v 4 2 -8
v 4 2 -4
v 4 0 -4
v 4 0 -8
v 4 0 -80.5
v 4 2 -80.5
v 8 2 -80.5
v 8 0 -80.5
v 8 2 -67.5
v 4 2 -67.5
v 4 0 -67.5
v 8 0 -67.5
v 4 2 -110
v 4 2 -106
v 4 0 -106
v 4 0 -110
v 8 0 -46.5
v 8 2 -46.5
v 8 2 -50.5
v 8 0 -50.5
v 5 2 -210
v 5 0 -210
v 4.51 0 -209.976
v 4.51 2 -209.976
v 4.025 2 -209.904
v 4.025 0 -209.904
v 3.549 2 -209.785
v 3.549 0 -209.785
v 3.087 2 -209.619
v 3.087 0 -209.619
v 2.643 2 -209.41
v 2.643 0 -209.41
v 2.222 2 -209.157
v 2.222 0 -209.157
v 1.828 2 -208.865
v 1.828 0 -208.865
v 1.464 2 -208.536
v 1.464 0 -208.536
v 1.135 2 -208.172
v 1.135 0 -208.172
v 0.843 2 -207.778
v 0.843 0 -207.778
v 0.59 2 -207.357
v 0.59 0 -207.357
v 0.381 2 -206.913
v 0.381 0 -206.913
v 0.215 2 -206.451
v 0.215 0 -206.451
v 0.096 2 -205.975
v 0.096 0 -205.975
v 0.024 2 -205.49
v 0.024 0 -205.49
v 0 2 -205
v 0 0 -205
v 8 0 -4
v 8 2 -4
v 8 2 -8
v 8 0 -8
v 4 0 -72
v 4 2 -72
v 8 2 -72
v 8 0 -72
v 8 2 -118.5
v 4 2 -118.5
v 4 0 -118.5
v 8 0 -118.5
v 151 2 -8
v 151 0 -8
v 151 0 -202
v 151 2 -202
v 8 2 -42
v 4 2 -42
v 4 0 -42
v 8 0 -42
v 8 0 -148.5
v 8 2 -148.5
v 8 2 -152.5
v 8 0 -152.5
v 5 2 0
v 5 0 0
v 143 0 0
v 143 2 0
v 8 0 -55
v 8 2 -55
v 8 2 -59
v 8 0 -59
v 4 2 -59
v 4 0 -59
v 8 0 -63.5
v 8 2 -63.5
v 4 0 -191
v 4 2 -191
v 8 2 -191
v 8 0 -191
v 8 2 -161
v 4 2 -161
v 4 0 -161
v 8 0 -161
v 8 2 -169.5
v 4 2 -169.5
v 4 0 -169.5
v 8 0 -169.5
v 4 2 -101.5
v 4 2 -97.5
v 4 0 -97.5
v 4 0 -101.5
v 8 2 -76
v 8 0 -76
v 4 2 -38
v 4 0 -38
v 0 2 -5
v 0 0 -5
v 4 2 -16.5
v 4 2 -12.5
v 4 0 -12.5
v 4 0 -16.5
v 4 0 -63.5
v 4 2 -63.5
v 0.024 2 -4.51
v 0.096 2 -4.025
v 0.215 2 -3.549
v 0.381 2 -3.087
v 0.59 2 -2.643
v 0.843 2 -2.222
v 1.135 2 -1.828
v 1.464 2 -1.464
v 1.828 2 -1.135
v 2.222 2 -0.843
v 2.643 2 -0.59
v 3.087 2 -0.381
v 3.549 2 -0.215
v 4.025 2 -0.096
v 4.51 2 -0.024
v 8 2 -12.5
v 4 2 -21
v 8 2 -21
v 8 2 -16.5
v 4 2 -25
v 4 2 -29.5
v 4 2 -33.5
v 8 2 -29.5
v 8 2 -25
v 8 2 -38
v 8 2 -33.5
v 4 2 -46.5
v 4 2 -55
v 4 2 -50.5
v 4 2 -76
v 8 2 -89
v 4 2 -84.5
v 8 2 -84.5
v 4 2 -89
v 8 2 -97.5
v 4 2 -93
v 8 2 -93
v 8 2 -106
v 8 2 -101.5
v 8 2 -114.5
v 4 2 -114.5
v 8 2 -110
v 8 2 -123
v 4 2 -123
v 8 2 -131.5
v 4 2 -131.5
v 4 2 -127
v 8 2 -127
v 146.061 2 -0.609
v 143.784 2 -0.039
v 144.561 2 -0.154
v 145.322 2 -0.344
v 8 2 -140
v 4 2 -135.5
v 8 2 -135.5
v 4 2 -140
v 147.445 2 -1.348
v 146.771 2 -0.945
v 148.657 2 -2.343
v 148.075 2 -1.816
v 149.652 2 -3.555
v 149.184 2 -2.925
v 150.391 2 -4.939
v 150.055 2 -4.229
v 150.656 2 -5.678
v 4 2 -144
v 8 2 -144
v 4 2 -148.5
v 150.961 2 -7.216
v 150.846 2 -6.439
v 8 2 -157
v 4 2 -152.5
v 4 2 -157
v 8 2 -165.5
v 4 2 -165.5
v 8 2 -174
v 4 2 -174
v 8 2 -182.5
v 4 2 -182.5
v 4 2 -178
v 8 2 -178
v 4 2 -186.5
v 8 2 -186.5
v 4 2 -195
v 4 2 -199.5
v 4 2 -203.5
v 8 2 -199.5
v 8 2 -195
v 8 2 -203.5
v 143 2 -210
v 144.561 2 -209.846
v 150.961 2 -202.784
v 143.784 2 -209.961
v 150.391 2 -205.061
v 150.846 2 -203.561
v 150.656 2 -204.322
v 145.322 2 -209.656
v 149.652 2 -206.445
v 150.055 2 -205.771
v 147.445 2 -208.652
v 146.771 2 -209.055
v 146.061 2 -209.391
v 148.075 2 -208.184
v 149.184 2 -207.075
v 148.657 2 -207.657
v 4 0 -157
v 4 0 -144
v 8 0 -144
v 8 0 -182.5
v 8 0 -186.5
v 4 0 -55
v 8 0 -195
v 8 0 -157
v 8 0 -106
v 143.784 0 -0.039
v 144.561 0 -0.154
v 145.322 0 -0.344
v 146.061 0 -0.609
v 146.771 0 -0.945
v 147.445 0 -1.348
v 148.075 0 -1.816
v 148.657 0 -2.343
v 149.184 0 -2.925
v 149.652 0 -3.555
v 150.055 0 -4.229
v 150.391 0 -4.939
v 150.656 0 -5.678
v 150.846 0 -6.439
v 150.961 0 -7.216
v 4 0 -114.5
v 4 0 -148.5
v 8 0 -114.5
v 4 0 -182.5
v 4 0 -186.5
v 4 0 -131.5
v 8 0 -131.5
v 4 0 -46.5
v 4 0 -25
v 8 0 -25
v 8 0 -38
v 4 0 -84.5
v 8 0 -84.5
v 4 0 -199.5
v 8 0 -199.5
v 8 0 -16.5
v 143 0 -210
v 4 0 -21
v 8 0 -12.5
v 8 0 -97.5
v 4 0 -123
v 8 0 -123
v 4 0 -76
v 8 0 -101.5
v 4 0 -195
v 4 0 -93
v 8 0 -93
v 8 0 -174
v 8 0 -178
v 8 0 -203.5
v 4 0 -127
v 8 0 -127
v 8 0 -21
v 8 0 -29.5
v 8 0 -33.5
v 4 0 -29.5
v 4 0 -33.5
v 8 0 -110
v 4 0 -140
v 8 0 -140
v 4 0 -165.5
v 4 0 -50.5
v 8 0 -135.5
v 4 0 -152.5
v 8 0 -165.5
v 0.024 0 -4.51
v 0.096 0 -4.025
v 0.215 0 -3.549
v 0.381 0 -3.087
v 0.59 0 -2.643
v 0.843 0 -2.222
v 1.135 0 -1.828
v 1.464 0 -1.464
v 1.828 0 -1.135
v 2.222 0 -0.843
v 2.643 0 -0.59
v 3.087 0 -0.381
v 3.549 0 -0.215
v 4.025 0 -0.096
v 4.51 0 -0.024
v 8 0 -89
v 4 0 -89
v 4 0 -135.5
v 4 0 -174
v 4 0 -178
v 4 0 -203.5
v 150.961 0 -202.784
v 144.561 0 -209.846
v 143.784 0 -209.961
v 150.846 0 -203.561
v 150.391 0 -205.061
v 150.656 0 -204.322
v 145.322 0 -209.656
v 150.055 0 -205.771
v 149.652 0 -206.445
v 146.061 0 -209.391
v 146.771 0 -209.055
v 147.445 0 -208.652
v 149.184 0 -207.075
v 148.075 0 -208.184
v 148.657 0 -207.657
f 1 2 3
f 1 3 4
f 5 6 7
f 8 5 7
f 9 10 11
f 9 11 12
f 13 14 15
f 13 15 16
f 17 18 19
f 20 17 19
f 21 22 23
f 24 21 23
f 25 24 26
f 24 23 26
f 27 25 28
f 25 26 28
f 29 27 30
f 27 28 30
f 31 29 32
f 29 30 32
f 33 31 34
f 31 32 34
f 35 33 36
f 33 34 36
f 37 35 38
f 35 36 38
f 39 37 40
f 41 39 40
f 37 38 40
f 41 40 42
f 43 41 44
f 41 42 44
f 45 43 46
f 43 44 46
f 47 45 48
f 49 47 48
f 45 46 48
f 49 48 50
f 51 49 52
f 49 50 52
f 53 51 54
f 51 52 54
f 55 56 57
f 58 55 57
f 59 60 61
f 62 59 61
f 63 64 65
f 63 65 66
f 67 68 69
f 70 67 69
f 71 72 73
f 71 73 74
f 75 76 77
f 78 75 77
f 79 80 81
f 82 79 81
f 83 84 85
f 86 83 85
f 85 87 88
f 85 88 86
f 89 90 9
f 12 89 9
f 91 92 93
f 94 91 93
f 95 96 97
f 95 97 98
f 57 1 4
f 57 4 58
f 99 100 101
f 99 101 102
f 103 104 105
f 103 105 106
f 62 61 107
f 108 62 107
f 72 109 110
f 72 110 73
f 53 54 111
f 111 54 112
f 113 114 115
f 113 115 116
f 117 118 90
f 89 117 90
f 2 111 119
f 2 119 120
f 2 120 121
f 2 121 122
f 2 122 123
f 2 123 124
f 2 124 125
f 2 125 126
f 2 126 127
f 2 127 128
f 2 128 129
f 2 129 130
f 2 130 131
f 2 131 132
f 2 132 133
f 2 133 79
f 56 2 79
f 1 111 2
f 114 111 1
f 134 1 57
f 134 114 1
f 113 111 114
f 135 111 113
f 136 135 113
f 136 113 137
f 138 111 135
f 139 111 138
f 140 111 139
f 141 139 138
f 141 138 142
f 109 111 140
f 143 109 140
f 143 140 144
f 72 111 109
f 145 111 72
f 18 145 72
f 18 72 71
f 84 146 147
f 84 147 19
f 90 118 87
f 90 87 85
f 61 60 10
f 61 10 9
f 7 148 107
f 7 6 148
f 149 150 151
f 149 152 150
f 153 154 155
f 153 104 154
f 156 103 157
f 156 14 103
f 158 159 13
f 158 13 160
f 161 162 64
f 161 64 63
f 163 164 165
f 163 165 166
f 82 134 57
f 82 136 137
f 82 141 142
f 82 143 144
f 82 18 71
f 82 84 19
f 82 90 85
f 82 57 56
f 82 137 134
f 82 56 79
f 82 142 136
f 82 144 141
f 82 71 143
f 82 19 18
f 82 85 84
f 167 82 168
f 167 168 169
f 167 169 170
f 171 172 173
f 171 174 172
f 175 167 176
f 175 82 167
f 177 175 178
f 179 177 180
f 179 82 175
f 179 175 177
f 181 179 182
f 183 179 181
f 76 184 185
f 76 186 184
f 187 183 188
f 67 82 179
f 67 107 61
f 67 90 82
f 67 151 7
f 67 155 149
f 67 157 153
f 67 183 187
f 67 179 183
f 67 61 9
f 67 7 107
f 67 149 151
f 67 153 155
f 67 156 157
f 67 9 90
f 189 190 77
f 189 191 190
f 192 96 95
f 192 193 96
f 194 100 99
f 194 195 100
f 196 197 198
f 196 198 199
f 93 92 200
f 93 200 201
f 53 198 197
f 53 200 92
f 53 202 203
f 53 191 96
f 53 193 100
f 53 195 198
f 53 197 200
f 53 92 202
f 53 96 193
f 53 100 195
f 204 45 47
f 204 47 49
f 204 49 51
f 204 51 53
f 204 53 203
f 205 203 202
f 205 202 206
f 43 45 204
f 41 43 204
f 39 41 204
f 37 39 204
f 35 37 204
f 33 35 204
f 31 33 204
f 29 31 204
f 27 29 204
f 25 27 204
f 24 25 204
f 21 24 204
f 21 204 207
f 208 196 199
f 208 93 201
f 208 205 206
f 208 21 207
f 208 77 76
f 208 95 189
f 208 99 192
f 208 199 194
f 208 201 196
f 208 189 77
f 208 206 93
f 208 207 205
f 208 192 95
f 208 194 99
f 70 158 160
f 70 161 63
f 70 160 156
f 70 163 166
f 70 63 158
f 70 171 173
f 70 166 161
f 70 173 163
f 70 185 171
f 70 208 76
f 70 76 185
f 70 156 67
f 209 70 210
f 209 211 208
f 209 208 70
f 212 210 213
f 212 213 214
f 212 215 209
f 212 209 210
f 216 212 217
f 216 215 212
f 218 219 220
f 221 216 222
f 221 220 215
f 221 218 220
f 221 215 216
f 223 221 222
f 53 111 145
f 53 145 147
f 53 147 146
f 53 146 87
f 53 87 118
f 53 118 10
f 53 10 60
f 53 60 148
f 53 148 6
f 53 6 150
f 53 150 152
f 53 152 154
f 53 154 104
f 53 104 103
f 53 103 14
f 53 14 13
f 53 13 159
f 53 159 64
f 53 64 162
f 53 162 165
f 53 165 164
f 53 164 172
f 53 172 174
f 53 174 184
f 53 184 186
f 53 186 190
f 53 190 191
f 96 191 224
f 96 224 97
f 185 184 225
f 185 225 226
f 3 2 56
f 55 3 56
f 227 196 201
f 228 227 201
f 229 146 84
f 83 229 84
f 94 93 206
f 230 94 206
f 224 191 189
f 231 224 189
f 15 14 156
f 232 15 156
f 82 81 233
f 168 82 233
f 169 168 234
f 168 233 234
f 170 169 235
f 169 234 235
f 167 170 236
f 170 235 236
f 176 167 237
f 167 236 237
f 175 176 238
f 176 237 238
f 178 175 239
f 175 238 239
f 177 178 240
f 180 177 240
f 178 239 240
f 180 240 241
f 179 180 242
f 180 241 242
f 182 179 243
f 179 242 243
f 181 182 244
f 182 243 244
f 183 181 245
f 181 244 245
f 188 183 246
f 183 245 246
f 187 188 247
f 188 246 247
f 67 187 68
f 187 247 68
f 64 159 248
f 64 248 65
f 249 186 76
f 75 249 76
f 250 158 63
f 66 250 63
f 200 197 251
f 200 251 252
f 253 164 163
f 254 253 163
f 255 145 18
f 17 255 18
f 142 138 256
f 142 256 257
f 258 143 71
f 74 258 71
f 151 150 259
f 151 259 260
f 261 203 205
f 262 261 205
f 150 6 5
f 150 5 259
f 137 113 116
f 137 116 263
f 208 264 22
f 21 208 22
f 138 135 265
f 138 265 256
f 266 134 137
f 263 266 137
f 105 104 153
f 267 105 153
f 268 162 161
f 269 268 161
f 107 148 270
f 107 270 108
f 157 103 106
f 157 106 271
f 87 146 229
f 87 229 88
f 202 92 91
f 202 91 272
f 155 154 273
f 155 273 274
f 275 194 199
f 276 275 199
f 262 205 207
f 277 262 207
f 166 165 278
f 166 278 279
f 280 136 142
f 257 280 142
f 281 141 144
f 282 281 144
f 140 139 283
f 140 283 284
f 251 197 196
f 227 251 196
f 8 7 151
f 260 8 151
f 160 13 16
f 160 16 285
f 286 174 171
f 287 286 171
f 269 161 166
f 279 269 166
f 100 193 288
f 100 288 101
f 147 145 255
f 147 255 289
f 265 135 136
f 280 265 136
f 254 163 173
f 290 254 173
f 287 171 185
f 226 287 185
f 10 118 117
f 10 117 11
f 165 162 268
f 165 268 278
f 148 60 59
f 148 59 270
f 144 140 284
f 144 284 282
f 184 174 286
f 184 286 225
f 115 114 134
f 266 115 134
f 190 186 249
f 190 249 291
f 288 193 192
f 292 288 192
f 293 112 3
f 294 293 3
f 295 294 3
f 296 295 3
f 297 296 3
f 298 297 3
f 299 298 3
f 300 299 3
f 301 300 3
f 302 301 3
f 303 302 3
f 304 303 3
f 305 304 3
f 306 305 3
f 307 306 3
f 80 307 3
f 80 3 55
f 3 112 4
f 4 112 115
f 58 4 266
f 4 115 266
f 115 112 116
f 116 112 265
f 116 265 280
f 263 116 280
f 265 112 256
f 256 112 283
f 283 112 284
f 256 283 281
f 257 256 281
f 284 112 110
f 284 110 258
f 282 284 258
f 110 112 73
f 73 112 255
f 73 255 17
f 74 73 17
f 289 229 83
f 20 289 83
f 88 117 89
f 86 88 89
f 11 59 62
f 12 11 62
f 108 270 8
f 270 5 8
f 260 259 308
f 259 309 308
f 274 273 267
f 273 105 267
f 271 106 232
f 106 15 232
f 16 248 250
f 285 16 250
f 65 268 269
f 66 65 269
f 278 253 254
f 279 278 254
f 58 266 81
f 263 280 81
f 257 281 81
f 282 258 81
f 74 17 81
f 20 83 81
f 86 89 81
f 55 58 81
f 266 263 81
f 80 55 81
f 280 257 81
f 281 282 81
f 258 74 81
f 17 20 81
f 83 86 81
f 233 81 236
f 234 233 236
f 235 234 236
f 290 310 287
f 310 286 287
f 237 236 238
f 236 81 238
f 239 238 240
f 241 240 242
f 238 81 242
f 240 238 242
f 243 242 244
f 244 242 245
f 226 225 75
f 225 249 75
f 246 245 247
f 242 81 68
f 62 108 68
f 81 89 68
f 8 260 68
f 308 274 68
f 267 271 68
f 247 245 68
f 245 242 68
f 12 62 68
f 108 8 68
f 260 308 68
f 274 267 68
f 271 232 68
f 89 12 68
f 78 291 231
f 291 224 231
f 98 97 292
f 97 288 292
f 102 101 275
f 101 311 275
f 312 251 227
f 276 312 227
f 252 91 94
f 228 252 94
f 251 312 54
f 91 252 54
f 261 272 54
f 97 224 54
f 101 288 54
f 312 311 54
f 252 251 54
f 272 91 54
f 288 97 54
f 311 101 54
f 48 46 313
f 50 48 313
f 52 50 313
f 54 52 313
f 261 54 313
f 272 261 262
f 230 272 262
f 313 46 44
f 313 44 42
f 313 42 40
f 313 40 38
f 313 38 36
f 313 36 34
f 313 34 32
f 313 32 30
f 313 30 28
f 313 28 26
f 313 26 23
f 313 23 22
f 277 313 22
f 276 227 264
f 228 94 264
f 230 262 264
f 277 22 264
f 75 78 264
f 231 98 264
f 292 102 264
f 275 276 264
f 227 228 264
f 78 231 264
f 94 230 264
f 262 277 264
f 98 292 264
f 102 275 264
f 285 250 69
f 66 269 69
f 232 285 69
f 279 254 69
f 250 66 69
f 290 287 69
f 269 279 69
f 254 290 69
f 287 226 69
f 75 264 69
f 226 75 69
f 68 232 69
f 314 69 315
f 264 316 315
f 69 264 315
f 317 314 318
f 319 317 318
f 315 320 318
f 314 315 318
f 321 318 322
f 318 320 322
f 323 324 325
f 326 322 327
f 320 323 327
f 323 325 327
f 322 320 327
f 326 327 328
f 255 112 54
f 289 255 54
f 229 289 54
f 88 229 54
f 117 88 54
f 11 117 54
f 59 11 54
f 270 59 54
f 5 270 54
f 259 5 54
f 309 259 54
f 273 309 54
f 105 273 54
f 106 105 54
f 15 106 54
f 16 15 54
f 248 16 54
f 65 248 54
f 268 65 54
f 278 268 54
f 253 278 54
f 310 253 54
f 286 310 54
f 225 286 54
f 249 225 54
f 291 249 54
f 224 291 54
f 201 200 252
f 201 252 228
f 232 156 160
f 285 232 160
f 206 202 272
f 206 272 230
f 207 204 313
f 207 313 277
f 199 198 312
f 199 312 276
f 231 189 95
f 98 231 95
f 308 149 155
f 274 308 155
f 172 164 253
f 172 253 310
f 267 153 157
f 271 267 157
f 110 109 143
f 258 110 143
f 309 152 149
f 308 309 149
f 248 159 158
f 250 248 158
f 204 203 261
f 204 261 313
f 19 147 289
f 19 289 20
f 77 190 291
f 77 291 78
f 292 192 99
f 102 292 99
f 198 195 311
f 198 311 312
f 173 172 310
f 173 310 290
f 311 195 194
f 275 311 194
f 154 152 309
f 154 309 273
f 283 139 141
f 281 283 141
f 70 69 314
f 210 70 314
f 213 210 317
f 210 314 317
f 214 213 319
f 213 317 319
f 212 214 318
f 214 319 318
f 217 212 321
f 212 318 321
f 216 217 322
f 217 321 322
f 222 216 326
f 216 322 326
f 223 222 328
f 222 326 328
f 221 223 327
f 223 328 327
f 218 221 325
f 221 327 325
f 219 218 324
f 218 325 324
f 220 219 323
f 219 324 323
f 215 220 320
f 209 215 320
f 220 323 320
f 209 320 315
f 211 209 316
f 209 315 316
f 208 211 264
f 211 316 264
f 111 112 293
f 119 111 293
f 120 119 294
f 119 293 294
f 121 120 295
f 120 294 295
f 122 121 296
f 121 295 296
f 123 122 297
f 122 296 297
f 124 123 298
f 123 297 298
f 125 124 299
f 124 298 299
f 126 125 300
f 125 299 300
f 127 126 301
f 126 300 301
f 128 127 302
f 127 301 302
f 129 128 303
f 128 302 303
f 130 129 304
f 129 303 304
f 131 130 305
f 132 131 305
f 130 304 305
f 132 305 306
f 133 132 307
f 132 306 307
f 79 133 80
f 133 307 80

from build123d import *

# Parameters (mm, degrees)
BOSS_EXTRUDE1_DEPTH = 2
SKETCH2_W           = 4
SKETCH2_H           = 4
CUT_EXTRUDE1_DEPTH  = 2
LPATTERN1_COUNT     = 24
LPATTERN1_PITCH     = 8.5


with BuildPart() as part:
    # Sketch1 → Boss-Extrude1 (new body)
    with BuildSketch(Plane(origin=(0, 0, 0), x_dir=(1, 0, 0), z_dir=(0, 1, 0))):
        with BuildLine():
            Line((5, 0), (143, 0))
            ThreePointArc((143, 0), (148.656854249, 2.343145751), (151, 8))
            Line((151, 8), (151, 202))
            ThreePointArc((151, 202), (148.656854249, 207.656854249), (143, 210))
            Line((143, 210), (5, 210))
            ThreePointArc((5, 210), (1.464466094, 208.535533906), (0, 205))
            Line((0, 205), (0, 5))
            ThreePointArc((0, 5), (1.464466094, 1.464466094), (5, 0))
        make_face()
    extrude(amount=BOSS_EXTRUDE1_DEPTH)

    # Sketch2 → Cut-Extrude1 (cut)
    with BuildSketch(Plane(origin=(0, 2, 0), x_dir=(1, 0, 0), z_dir=(0, 1, 0))):
        with Locations((6, 201.5)):
            Rectangle(SKETCH2_W, SKETCH2_H)
    cut_extrude1 = extrude(amount=-CUT_EXTRUDE1_DEPTH, mode=Mode.SUBTRACT)

    # LPattern1: Cut-Extrude1 ×24
    with Locations(*[(0, 0, i * LPATTERN1_PITCH) for i in range(1, LPATTERN1_COUNT)]):
        add(cut_extrude1, mode=Mode.SUBTRACT)


solid = part.part
